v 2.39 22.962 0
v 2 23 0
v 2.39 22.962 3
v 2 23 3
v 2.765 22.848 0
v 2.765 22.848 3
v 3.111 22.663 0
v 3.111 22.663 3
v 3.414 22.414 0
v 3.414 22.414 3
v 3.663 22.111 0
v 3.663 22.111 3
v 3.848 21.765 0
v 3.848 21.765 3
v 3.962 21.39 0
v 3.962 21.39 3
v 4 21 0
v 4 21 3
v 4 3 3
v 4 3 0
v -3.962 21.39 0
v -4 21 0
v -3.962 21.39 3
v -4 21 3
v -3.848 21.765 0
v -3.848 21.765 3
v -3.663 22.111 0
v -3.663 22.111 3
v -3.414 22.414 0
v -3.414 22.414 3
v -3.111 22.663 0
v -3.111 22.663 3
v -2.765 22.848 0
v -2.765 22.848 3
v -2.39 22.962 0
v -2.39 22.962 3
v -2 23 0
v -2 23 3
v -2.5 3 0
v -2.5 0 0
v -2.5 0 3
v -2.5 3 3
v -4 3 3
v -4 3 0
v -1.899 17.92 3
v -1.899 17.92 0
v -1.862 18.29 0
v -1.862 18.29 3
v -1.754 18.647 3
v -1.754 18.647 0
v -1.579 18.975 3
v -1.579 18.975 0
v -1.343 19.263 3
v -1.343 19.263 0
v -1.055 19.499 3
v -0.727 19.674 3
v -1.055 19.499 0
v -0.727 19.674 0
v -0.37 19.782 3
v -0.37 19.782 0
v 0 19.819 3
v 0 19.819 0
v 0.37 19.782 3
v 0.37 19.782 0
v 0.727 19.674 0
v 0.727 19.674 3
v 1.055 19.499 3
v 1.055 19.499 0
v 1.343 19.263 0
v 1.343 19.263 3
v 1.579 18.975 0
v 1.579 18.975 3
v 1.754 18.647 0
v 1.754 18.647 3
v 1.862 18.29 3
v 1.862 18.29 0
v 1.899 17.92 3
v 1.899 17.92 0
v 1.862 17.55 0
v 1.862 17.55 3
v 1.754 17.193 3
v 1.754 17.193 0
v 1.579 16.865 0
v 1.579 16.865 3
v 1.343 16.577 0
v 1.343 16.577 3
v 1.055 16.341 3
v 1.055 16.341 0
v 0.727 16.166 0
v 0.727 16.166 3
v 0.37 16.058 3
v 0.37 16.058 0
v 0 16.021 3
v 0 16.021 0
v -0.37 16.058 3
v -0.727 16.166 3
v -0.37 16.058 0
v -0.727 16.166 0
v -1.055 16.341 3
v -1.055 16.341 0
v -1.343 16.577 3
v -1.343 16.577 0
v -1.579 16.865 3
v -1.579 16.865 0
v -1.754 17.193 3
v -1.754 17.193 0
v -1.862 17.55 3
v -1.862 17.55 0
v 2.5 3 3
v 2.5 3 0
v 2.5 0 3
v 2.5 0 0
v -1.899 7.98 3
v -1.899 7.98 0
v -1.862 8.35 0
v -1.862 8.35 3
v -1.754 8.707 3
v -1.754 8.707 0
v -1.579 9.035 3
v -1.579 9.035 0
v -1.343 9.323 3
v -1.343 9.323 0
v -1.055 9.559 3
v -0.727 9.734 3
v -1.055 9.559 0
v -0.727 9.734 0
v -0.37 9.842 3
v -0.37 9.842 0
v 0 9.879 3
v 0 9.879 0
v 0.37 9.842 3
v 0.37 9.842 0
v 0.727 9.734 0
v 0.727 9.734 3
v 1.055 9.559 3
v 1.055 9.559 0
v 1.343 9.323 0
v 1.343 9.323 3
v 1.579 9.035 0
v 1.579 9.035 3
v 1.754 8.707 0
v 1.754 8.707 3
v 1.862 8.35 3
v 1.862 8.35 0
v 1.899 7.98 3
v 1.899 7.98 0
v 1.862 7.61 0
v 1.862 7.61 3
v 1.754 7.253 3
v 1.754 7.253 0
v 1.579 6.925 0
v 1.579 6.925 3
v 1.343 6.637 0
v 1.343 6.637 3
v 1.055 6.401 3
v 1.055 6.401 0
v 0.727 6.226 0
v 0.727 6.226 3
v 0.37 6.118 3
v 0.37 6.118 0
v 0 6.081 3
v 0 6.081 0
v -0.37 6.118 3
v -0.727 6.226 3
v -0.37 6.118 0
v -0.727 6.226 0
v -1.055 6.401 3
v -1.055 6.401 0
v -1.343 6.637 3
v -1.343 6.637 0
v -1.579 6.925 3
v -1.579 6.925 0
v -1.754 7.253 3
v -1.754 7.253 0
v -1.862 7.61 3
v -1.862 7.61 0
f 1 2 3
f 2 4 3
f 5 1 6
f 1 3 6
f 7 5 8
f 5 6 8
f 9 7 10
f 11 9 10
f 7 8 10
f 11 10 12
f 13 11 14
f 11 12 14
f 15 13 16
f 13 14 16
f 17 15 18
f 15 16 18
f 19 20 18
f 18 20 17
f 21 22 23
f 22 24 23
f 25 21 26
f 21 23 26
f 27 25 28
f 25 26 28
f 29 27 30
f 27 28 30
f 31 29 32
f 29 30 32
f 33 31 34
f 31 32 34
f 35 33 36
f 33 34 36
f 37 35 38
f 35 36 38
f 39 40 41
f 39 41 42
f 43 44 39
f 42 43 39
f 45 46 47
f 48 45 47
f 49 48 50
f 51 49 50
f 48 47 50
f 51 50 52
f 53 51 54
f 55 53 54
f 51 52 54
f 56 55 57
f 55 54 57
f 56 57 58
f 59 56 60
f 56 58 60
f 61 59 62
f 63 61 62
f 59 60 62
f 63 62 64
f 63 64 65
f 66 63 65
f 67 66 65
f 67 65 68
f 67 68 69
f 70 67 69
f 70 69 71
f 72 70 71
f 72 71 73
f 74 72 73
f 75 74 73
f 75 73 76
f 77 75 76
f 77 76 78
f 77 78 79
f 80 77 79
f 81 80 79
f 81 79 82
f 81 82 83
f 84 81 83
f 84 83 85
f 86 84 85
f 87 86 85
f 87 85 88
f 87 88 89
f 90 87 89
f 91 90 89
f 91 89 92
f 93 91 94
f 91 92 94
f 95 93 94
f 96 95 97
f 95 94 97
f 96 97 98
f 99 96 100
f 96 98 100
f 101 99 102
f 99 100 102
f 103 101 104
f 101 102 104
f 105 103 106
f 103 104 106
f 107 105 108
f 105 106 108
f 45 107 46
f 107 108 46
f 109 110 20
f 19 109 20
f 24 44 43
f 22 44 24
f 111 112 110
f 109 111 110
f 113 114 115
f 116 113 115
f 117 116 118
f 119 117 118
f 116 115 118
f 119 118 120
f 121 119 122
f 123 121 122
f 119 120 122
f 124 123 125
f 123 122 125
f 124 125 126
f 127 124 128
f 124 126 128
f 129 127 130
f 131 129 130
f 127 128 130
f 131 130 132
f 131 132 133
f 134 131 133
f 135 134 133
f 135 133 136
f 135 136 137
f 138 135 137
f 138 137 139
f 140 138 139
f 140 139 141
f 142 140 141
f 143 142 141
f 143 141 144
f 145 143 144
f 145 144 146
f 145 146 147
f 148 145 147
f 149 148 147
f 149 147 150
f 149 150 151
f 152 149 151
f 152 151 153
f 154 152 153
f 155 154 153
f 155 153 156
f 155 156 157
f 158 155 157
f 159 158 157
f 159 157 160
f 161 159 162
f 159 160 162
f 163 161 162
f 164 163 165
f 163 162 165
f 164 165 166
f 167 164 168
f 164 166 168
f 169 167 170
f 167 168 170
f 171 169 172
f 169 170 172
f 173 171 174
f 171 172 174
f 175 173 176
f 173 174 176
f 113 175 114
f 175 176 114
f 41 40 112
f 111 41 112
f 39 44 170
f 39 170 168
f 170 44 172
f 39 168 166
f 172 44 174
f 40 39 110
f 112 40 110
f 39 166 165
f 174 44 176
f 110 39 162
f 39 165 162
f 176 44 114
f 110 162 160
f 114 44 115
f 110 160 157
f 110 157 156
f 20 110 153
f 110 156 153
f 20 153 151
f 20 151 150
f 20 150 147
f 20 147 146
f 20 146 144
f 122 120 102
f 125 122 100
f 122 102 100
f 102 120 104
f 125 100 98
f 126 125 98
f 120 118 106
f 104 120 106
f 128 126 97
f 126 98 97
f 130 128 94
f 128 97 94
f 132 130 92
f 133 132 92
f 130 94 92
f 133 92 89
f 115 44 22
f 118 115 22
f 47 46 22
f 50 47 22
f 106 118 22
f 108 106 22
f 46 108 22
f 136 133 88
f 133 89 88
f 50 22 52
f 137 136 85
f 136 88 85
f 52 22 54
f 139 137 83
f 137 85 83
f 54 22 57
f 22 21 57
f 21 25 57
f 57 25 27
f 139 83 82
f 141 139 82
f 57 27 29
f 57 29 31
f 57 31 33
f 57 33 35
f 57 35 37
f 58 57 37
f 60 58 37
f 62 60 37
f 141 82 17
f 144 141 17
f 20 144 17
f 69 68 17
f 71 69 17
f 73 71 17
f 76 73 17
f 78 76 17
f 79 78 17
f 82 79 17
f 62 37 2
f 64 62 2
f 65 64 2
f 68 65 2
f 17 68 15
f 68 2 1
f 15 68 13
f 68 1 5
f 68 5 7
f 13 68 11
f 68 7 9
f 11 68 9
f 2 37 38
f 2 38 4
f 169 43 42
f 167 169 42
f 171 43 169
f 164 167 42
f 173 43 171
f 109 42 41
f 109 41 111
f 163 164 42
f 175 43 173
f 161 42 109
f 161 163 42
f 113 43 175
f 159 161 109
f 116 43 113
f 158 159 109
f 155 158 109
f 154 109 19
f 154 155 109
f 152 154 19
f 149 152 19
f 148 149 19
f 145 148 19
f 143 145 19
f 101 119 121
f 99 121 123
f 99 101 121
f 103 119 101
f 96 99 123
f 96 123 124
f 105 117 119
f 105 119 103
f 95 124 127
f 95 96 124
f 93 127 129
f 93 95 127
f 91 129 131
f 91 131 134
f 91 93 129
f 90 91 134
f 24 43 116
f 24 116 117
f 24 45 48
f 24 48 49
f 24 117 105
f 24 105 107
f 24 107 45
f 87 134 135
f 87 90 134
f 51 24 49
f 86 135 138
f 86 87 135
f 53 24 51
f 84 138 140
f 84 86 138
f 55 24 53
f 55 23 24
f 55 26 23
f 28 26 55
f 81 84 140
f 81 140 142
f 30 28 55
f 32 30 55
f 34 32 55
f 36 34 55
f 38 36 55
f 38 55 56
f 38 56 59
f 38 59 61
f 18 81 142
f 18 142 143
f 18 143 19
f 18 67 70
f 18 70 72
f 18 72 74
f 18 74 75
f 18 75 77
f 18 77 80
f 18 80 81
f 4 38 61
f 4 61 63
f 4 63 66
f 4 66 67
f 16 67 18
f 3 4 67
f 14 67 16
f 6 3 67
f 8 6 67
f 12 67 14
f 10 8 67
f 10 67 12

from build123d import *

# Parameters (mm, degrees)
SKETCH1_W             = 8
SKETCH1_H             = 20
SKETCH1_W_2           = 5
SKETCH1_H_2           = 3
BOSS_EXTRUDE1_DEPTH   = 3
F_6_CLEARANCE_HOLE1_D = 3.7973
FILLET1_R             = 2


with BuildPart() as part:
    # Sketch1 → Boss-Extrude1 (new body)
    with BuildSketch(Plane.XY):
        with Locations((0, 13)):
            Rectangle(SKETCH1_W, SKETCH1_H)
        with Locations((0, 1.5)):
            Rectangle(SKETCH1_W_2, SKETCH1_H_2)
    extrude(amount=BOSS_EXTRUDE1_DEPTH)

    # #6 Clearance Hole1 (through all)
    with Locations(Plane.XY.offset(3)):
        with Locations((0, 17.92), (0, 7.98)):
            Hole(F_6_CLEARANCE_HOLE1_D / 2)

    # Fillet1
    fillet1_edges = [part.edges().sort_by_distance(p)[0] for p in [
        (-4, 23, 1.5),
        (4, 23, 1.5),
    ]]
    fillet(fillet1_edges, radius=FILLET1_R)


solid = part.part
